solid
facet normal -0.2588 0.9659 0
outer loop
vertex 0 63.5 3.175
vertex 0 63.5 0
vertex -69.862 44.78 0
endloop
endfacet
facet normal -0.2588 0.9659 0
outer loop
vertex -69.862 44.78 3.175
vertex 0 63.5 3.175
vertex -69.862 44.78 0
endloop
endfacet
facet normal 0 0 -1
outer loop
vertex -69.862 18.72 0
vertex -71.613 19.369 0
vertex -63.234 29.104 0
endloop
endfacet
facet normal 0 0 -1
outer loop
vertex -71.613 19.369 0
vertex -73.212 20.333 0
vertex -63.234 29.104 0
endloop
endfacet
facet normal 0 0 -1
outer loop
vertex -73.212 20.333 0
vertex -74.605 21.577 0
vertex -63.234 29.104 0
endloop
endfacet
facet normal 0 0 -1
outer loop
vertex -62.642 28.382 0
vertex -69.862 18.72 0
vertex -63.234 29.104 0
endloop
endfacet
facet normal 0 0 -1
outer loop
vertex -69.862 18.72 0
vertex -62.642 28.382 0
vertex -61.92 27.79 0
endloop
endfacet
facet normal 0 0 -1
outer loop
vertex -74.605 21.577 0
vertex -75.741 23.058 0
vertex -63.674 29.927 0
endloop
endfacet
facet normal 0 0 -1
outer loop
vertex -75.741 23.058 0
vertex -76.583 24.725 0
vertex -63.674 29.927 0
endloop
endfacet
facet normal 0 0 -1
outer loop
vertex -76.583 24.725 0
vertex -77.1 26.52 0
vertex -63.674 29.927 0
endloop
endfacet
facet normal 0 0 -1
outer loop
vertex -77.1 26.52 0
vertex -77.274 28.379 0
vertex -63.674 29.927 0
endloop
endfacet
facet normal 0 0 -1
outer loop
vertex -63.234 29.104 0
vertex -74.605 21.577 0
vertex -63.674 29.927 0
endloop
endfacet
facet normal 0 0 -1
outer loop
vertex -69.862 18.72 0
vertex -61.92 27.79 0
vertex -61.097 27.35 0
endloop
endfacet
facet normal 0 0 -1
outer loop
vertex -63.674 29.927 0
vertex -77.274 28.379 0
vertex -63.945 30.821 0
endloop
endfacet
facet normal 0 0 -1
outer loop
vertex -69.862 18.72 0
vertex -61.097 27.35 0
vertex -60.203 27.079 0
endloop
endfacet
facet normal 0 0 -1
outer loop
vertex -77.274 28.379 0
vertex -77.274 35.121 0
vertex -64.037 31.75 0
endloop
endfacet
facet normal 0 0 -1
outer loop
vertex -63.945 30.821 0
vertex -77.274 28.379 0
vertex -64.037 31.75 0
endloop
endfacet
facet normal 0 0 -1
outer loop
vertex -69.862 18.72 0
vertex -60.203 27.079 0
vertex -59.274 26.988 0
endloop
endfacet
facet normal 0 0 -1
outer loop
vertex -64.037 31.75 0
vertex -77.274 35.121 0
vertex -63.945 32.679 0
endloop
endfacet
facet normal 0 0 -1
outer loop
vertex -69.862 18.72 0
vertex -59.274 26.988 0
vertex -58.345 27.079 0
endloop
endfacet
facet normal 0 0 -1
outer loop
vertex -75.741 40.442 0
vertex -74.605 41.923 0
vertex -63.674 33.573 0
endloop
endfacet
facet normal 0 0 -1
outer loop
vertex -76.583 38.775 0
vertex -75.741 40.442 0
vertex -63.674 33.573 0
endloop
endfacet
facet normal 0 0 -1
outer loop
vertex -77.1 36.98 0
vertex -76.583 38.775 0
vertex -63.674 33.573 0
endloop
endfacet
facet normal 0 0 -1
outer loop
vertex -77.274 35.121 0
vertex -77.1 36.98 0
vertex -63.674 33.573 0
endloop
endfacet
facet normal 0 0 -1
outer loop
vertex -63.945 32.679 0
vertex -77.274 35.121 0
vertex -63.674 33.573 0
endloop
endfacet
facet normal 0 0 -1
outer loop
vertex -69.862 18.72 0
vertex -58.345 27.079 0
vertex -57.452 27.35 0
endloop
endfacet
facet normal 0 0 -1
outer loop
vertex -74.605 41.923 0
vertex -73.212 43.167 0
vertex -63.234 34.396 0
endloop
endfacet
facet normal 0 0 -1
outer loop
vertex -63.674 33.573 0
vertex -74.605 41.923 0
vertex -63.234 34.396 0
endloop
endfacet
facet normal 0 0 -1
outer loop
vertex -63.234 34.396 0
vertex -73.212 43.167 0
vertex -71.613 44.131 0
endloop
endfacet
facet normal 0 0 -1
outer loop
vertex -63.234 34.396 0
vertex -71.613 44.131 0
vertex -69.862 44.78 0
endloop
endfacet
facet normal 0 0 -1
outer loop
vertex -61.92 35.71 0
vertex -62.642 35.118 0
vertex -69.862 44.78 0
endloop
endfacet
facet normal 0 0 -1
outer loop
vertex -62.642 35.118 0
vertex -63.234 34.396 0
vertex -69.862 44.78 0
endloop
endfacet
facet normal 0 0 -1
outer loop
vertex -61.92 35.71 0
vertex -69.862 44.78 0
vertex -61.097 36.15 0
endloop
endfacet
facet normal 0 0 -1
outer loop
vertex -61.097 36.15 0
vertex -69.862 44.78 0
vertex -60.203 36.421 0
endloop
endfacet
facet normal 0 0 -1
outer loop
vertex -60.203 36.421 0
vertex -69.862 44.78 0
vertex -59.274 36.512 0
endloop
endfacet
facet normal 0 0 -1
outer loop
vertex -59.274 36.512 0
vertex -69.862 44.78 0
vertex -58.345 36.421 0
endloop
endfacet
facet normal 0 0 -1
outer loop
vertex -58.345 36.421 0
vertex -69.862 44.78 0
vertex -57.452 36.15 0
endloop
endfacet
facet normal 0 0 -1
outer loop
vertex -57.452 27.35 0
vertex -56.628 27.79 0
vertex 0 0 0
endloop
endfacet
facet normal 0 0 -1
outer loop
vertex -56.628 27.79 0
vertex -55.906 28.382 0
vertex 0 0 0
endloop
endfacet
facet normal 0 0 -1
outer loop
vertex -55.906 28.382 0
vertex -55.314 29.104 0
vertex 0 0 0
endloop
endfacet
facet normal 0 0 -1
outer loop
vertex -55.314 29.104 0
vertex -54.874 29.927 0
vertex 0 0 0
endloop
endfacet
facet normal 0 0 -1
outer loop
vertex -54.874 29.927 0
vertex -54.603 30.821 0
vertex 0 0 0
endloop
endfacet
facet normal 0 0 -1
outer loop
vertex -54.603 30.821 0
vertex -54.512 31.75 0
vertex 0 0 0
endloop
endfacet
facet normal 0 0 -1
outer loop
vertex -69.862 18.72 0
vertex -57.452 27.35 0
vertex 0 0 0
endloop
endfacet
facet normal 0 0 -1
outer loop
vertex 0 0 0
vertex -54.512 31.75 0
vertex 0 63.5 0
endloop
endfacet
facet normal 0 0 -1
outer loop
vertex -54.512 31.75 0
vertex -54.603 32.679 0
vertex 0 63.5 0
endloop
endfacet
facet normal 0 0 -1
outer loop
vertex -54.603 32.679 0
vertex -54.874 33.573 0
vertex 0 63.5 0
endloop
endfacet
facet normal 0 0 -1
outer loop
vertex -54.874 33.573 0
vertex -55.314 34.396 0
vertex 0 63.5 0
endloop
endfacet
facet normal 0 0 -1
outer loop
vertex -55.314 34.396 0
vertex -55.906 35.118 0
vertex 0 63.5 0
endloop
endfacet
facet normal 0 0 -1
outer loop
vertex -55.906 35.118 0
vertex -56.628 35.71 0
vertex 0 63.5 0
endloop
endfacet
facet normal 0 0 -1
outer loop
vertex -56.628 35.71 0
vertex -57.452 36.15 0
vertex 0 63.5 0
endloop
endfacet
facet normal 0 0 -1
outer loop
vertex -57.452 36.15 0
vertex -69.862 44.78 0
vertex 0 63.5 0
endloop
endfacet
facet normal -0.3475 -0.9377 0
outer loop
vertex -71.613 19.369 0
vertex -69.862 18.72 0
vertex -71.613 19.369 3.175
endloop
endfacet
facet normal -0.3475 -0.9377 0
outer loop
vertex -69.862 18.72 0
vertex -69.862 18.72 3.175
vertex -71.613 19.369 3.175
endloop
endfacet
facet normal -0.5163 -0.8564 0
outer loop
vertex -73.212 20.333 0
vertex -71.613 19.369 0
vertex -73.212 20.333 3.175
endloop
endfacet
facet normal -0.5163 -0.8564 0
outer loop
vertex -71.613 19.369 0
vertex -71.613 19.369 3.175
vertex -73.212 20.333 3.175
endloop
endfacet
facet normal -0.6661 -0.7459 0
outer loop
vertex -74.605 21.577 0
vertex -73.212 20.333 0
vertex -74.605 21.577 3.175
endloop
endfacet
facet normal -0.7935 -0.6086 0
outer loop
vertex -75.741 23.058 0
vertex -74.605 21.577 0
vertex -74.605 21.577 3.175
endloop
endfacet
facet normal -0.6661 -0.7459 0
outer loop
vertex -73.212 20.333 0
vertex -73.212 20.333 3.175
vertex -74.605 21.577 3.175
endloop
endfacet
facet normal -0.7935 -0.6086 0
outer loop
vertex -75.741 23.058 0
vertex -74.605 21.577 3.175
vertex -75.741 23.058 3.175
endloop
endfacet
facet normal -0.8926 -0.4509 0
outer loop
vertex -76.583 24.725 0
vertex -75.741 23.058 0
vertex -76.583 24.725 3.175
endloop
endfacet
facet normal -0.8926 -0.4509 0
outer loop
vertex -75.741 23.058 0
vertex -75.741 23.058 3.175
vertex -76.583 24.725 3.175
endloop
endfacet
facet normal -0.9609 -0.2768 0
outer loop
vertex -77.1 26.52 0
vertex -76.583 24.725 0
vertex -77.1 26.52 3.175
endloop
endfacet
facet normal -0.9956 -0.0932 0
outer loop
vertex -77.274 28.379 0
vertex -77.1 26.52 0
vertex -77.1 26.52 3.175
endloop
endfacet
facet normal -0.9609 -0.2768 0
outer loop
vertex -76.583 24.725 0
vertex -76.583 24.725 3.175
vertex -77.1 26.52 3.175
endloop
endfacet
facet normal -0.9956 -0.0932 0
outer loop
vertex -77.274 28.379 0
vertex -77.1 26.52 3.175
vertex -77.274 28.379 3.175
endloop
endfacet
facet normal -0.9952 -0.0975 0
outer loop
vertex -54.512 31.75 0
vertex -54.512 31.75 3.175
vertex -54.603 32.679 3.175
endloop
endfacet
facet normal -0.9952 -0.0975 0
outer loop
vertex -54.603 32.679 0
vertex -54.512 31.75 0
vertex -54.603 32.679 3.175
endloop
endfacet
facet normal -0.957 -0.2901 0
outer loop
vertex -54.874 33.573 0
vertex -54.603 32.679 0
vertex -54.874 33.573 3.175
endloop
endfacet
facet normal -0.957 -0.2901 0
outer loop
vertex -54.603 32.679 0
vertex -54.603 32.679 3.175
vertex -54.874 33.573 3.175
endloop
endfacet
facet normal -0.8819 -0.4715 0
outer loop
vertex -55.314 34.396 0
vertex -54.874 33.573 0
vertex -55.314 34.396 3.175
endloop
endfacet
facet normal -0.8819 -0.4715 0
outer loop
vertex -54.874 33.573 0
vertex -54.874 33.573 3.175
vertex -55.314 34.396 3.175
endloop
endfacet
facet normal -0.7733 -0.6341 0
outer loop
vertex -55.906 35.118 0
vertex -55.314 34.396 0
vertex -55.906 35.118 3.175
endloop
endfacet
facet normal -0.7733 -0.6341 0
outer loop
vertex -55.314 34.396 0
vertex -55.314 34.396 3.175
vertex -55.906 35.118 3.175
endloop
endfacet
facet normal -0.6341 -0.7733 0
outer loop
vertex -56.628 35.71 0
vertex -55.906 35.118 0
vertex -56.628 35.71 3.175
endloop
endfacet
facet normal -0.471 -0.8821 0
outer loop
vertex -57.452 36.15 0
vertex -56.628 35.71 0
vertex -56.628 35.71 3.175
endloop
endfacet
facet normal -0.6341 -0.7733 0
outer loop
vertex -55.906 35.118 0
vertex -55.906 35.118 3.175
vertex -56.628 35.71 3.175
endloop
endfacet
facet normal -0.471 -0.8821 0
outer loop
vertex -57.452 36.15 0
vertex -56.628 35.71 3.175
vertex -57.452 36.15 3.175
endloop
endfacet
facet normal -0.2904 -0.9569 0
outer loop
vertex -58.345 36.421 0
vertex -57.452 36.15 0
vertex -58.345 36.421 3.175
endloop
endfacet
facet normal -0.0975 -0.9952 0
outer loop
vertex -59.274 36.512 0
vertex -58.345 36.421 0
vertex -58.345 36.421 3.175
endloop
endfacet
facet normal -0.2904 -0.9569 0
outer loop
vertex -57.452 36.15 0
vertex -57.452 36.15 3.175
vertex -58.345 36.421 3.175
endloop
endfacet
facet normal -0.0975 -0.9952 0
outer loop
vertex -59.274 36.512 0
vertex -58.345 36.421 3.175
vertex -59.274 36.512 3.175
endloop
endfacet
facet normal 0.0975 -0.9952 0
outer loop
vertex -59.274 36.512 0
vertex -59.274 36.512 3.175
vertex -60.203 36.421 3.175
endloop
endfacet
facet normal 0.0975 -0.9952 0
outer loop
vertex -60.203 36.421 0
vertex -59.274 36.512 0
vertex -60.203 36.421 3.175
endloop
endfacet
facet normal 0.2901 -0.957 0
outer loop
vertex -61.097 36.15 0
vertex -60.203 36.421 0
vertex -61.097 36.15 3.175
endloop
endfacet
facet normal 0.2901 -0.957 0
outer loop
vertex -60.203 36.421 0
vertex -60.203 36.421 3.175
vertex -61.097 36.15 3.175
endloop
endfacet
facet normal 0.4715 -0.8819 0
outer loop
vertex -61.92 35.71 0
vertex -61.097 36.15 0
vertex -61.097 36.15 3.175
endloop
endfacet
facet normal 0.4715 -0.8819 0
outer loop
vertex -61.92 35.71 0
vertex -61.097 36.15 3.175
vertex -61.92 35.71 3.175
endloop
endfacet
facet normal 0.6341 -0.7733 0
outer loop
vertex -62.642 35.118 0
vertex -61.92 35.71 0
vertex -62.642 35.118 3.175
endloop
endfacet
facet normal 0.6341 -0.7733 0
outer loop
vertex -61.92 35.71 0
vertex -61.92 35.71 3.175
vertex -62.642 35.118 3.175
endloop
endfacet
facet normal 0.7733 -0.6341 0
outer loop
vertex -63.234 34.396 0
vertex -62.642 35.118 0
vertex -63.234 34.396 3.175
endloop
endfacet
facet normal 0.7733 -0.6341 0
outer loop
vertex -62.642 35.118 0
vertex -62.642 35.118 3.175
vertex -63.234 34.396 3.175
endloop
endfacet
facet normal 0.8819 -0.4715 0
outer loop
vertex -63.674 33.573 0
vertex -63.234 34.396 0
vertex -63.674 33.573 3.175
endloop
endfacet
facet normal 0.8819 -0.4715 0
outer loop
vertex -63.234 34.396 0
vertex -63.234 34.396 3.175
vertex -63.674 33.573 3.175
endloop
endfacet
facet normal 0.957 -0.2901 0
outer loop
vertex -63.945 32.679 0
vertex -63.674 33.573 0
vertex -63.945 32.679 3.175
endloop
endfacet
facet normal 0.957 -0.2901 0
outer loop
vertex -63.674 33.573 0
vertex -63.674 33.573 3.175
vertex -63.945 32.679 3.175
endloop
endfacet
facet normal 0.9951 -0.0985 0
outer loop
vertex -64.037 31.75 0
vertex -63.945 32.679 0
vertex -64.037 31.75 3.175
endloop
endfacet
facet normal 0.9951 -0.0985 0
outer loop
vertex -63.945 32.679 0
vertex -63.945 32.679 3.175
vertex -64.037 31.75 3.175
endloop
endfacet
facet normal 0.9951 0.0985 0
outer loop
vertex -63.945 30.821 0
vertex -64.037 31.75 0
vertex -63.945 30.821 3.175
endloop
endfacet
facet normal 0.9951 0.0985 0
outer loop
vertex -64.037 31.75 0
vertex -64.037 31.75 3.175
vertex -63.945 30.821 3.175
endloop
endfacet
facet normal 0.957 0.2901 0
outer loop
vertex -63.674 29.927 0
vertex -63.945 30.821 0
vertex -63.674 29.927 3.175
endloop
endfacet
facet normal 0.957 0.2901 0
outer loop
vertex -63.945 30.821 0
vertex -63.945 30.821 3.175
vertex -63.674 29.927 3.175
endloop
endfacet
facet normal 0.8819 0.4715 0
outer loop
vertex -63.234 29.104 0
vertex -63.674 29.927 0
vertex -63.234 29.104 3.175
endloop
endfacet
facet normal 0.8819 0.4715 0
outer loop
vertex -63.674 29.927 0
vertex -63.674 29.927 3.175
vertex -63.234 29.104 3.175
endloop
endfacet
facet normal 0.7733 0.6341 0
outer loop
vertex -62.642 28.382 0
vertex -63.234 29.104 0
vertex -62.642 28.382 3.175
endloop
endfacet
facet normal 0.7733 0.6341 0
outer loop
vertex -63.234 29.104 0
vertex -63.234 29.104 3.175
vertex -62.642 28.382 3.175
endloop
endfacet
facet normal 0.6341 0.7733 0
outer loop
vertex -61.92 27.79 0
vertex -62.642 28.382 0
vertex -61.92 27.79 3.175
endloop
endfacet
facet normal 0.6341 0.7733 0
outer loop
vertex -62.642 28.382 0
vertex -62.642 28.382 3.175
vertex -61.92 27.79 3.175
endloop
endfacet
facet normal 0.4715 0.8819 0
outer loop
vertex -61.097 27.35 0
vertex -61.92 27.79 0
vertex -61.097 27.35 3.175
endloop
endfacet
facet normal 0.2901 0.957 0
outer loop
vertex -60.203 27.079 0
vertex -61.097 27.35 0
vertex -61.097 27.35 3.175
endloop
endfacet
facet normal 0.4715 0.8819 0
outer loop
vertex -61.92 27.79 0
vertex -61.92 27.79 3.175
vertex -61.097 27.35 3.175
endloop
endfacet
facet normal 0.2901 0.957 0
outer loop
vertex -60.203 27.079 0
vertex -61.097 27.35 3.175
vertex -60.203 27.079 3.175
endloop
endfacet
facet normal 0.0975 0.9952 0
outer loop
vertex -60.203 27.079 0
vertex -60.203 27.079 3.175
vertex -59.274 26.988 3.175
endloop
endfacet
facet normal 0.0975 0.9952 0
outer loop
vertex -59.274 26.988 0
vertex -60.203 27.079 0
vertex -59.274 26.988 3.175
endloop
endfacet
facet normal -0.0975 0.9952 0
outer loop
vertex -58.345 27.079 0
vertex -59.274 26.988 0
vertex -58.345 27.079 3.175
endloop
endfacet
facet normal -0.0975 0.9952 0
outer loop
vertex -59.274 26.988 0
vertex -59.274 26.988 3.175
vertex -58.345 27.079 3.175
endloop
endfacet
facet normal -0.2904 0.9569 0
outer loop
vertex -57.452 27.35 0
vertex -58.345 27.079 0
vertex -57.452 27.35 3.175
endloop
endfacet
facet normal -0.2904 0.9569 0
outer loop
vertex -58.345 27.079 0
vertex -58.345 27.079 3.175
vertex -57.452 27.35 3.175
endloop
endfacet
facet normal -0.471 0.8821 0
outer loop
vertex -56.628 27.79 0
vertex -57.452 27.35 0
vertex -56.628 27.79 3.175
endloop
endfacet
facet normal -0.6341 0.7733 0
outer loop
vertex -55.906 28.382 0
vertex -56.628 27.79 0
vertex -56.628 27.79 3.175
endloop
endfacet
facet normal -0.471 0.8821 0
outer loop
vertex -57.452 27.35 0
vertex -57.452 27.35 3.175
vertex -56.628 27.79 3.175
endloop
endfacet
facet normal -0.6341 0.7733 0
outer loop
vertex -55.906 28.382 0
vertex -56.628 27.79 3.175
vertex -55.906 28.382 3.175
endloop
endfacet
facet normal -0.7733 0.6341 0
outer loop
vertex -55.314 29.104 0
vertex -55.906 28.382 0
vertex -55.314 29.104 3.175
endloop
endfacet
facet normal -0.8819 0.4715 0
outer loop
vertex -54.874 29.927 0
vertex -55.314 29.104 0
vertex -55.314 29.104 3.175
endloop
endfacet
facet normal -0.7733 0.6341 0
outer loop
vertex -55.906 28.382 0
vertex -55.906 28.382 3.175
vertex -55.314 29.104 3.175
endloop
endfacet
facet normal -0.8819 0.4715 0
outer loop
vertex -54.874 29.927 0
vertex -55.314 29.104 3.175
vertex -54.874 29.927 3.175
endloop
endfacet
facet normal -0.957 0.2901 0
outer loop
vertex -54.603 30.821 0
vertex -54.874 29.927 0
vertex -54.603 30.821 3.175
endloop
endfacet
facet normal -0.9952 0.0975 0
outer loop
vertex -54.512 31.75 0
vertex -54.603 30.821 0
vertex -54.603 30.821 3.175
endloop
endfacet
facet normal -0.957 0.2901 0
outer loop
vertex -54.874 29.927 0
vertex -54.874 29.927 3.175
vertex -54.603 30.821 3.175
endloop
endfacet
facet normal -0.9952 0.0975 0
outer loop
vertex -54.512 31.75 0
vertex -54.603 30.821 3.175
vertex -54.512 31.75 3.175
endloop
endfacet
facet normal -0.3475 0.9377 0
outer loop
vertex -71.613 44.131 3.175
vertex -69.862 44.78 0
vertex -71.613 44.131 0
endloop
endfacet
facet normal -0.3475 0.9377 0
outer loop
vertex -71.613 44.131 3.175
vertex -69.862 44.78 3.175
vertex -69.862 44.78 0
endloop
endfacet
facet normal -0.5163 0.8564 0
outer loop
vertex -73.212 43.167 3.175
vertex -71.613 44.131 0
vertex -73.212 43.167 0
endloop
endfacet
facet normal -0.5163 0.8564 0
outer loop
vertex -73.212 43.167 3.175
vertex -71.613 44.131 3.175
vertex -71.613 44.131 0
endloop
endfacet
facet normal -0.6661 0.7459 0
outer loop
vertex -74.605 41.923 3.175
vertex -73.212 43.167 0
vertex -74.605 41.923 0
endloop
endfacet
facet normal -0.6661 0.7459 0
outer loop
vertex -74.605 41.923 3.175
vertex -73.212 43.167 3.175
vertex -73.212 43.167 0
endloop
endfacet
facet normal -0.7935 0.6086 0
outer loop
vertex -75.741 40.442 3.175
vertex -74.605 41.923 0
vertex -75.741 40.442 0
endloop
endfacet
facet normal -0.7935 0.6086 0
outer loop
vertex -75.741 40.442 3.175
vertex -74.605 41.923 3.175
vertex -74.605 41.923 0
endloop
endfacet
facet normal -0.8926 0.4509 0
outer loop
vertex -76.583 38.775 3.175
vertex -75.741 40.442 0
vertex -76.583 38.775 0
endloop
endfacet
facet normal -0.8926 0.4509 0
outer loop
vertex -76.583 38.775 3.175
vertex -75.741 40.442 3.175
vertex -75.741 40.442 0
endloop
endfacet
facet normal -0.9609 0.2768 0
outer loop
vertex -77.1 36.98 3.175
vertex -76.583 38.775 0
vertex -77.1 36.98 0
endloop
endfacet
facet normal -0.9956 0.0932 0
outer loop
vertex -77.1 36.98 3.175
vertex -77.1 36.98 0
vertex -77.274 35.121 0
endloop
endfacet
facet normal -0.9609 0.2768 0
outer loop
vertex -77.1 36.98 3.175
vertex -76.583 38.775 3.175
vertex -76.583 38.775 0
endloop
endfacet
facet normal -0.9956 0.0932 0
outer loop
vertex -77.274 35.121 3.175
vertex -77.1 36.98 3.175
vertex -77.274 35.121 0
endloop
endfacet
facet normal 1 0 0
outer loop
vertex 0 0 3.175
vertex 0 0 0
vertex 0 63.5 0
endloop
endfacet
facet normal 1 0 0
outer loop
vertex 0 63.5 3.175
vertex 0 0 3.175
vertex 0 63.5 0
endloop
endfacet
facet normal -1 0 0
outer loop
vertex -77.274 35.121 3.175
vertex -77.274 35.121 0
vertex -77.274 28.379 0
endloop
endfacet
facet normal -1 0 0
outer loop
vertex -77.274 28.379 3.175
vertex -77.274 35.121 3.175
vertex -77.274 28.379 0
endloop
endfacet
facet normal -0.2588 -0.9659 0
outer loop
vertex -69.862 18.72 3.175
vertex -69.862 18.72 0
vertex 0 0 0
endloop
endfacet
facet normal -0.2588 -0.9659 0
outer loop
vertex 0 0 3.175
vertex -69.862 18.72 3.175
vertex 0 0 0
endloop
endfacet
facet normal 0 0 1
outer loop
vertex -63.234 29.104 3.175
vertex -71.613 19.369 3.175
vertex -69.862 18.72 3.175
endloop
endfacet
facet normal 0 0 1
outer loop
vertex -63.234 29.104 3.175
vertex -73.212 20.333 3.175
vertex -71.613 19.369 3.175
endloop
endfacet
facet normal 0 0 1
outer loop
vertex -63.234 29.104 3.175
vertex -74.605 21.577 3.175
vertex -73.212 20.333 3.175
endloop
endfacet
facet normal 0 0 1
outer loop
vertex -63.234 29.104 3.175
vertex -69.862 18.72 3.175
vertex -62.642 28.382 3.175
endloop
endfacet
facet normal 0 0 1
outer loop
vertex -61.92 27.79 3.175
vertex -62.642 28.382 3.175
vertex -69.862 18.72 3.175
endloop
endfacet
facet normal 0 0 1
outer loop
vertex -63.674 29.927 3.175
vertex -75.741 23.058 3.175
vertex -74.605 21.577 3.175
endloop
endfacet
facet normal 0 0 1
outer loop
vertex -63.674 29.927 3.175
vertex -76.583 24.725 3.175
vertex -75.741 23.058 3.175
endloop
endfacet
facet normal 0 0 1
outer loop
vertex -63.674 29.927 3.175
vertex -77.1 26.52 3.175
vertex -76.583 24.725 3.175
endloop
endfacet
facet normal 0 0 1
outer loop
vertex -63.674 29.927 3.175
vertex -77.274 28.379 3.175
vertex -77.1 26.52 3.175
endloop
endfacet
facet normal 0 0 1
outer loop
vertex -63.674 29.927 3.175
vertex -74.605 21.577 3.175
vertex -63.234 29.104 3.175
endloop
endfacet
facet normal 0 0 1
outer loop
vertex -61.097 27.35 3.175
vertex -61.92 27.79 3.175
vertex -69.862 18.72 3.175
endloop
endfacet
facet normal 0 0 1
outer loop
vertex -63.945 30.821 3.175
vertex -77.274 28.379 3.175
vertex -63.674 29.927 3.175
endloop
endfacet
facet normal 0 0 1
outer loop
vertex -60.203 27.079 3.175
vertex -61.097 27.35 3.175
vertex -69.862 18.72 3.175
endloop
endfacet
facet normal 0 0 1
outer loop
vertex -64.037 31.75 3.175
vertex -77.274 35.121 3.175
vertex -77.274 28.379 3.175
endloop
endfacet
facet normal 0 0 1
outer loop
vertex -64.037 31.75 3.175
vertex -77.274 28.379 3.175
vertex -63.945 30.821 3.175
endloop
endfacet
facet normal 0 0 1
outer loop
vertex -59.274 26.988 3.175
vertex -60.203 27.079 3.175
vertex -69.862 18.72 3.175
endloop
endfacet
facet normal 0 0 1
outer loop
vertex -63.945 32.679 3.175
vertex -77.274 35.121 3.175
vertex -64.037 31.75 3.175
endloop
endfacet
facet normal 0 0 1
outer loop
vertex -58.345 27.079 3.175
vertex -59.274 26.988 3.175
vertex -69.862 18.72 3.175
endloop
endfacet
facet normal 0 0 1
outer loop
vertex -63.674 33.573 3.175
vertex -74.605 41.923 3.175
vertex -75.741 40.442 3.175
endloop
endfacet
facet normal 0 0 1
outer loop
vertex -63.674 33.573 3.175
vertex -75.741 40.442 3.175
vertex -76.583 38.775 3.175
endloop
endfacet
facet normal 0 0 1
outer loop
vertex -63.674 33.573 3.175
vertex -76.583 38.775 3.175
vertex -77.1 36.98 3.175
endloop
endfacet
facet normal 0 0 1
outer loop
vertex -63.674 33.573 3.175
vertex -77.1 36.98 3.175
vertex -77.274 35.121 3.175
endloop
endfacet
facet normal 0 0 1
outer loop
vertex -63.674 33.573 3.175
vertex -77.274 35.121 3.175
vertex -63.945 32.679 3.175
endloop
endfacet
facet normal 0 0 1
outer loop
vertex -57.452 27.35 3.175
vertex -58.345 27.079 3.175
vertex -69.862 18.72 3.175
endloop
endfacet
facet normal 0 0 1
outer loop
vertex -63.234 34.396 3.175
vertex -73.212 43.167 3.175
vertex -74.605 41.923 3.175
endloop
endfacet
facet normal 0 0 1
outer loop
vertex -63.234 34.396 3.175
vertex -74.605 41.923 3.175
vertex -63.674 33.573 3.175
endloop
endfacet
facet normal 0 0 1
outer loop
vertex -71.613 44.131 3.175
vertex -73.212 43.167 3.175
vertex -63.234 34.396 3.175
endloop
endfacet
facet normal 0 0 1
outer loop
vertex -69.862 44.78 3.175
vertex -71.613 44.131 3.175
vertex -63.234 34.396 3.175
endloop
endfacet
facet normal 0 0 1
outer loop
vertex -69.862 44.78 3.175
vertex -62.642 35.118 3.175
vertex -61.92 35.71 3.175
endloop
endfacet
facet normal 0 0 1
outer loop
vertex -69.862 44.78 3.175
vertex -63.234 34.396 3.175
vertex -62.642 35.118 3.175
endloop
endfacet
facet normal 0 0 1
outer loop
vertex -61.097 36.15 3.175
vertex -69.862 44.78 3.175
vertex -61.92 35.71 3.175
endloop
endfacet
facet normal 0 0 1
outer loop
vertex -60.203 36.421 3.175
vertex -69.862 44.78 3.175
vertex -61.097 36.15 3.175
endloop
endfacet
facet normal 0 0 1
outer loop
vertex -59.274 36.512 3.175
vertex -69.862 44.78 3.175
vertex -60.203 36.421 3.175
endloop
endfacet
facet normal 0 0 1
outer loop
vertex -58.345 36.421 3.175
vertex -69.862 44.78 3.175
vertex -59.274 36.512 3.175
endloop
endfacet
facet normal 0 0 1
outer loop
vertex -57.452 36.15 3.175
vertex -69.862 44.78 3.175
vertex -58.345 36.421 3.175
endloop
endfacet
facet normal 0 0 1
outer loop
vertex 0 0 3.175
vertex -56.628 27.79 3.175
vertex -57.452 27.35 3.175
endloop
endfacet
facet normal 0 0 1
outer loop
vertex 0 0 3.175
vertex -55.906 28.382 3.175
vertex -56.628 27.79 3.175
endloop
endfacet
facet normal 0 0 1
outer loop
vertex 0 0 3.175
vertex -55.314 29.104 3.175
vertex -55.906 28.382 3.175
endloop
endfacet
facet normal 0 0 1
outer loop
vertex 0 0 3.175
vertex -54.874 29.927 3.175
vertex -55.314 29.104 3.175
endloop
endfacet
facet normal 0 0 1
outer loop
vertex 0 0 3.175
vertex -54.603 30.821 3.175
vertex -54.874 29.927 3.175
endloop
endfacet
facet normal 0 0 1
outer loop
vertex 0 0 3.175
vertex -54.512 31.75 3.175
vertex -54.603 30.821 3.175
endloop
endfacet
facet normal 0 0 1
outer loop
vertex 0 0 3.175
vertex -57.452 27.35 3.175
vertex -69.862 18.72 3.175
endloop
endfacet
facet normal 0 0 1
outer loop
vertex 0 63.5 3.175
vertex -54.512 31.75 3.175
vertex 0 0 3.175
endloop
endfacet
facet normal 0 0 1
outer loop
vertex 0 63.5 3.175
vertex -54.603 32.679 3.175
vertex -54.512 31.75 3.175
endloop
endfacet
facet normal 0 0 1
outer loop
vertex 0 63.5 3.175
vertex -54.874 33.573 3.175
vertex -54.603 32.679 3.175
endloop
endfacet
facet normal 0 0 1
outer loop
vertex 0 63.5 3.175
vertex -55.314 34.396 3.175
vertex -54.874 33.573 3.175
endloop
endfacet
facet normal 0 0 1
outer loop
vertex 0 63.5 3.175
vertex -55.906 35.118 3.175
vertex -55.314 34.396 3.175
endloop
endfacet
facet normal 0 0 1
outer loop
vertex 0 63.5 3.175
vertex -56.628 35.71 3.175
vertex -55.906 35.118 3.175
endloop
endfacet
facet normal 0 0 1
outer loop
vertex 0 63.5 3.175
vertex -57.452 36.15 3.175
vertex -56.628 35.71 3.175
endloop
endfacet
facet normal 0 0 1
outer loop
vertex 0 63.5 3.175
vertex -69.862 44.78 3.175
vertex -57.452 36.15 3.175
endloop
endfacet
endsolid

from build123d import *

# Parameters (mm, degrees)
SALIENTE_EXTRUIR1_DEPTH = 3.175
CROQUIS2_R              = 4.7625
CORTAR_EXTRUIR1_DEPTH   = 3.175
REDONDEO1_R             = 10


with BuildPart() as part:
    # Croquis1 → Saliente-Extruir1 (new body)
    with BuildSketch(Plane.XY):
        Polygon((0, 0), (0, 63.5), (-77.274066103, 42.794476392), (-77.274066103, 20.705523608), align=None)
    extrude(amount=SALIENTE_EXTRUIR1_DEPTH)

    # Croquis2 → Cortar-Extruir1 (cut)
    with BuildSketch(Plane.XY.offset(3.175)):
        with Locations((-59.274066103, 31.75)):
            Circle(CROQUIS2_R)
    extrude(amount=-CORTAR_EXTRUIR1_DEPTH, mode=Mode.SUBTRACT)

    # Redondeo1
    redondeo1_edges = [part.edges().sort_by_distance(p)[0] for p in [
        (-77.274066103, 20.705523608, 1.5875),
        (-77.274066103, 42.794476392, 1.5875),
    ]]
    fillet(redondeo1_edges, radius=REDONDEO1_R)


solid = part.part
